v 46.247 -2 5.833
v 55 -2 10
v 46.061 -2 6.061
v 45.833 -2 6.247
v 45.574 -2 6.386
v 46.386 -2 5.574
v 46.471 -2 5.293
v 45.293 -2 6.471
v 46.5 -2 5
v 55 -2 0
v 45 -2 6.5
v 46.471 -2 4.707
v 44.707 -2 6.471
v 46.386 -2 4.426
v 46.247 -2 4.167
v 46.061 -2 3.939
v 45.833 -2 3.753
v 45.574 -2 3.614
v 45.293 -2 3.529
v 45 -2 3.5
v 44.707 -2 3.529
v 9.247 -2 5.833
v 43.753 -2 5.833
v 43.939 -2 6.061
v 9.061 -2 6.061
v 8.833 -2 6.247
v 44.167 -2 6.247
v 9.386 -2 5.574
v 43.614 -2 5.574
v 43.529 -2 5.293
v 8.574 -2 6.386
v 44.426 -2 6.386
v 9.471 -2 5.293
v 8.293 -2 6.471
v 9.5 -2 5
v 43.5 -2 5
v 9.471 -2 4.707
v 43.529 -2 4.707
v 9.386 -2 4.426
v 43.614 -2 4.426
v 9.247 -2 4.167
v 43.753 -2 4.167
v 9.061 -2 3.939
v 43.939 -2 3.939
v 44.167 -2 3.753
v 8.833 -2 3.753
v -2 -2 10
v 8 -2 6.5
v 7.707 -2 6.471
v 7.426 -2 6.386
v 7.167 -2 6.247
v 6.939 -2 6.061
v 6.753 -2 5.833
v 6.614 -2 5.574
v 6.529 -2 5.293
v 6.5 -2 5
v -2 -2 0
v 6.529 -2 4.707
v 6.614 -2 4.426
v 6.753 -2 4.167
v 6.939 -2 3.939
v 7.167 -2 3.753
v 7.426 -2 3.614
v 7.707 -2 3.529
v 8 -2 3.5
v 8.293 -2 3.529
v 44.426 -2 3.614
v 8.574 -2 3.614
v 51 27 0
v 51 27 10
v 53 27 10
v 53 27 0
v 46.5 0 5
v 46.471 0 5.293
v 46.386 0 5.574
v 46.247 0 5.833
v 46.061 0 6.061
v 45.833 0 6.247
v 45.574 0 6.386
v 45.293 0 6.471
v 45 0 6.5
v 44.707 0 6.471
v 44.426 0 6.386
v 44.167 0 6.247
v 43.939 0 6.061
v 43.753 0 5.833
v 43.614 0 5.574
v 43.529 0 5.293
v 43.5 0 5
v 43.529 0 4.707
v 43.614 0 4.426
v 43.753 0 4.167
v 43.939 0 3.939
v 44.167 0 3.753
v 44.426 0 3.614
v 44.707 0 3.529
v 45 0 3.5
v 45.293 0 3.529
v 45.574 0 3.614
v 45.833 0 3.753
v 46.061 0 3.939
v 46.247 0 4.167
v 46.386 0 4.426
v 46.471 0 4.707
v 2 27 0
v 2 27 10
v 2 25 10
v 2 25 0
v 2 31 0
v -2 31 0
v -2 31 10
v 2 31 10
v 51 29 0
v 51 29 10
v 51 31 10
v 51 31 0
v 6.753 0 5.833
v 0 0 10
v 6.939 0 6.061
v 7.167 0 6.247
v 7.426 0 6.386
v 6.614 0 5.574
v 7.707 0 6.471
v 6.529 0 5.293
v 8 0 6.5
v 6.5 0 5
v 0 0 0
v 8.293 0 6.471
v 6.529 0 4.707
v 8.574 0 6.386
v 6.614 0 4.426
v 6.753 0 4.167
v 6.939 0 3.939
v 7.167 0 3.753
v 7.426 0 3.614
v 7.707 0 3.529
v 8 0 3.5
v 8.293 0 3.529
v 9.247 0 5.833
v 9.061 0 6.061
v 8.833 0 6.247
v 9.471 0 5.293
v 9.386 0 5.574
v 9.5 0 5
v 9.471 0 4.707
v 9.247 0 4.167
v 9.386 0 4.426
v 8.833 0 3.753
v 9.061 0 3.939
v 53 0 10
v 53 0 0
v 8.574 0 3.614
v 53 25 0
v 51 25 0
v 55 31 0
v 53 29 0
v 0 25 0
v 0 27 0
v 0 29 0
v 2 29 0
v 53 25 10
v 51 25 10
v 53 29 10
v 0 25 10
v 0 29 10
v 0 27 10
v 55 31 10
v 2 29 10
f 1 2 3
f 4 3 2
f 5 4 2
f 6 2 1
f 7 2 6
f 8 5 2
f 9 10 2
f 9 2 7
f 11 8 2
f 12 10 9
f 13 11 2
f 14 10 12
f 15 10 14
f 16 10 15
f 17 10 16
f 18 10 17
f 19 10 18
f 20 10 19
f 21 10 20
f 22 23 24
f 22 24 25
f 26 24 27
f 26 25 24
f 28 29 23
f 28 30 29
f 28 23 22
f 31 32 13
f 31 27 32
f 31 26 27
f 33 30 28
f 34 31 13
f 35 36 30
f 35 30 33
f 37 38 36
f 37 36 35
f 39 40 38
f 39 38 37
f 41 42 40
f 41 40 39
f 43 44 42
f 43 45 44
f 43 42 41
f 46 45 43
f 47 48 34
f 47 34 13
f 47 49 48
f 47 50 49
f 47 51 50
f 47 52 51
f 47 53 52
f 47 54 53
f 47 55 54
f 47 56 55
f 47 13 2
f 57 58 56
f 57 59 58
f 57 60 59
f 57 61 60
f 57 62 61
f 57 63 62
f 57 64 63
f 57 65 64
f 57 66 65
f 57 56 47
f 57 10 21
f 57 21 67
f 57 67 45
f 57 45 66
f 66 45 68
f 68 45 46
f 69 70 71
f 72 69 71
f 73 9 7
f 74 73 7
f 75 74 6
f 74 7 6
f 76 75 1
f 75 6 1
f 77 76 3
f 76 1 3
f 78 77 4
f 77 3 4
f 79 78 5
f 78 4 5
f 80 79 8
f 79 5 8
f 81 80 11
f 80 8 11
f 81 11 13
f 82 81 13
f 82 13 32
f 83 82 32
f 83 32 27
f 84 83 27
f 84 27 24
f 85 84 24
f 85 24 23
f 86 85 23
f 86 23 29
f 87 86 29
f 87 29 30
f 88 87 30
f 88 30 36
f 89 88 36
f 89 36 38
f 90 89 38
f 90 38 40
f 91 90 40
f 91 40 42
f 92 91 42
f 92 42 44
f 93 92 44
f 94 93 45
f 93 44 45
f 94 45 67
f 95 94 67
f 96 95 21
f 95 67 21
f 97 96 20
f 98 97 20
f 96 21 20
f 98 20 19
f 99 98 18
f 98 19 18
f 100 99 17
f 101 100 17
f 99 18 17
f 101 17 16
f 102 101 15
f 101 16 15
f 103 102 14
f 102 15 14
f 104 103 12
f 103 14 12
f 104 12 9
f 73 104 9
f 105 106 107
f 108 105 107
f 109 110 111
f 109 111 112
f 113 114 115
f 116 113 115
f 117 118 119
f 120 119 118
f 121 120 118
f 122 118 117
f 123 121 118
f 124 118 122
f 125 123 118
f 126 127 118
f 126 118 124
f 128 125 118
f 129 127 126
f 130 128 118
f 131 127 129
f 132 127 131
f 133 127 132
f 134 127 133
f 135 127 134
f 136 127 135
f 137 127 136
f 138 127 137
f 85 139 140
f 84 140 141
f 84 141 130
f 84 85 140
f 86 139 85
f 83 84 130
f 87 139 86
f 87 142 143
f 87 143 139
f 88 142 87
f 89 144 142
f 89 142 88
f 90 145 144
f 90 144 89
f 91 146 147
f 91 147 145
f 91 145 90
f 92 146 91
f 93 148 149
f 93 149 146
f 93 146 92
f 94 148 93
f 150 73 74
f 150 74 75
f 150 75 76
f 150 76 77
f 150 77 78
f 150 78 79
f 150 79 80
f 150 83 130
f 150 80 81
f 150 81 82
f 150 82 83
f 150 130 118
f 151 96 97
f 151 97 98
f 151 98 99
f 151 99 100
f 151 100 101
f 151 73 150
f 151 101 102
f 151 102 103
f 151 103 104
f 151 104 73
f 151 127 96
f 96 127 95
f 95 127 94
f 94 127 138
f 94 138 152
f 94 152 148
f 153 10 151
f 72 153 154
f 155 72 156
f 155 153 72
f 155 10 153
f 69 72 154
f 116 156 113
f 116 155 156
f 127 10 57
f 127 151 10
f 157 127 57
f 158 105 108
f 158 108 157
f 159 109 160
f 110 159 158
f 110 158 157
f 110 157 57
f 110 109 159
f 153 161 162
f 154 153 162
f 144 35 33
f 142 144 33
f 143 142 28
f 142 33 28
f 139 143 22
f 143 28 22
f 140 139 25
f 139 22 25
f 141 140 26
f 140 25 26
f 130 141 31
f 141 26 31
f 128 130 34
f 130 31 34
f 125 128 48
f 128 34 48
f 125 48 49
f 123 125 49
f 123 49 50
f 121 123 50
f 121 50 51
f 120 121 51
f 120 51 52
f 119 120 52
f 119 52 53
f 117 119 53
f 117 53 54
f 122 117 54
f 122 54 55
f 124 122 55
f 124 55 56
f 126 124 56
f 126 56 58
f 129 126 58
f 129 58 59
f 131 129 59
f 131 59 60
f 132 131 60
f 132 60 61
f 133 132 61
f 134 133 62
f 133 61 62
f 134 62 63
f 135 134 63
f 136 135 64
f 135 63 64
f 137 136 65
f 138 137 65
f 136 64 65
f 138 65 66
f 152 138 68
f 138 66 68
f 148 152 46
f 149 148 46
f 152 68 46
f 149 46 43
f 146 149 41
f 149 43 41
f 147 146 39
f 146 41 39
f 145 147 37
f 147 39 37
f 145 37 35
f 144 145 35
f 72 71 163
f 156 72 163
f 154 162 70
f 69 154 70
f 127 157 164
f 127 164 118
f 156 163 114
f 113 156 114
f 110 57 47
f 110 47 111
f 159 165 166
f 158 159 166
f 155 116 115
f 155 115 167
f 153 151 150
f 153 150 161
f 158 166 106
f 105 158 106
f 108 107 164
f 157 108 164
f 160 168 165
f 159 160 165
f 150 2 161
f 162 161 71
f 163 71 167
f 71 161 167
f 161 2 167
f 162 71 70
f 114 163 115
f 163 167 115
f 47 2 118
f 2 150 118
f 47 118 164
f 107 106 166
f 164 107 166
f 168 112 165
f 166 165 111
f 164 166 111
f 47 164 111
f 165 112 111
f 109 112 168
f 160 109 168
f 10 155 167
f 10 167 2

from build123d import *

# Parameters (mm, degrees)
SALIENTE_EXTRUIR1_DEPTH = 10
CROQUIS2_R              = 1.5
CORTAR_EXTRUIR1_DEPTH   = 10


with BuildPart() as part:
    # Croquis1 → Saliente-Extruir1 (new body)
    with BuildSketch(Plane.XY):
        Polygon((0, 0), (53, 0), (53, 25), (51, 25), (51, 27), (53, 27), (53, 29), (51, 29), (51, 31), (55, 31), (55, -2), (-2, -2), (-2, 31), (2, 31), (2, 29), (0, 29), (0, 27), (2, 27), (2, 25), (0, 25), align=None)
    extrude(amount=SALIENTE_EXTRUIR1_DEPTH)

    # Croquis2 → Cortar-Extruir1 (cut)
    with BuildSketch(Plane.XZ.offset(2)):
        with Locations((45, 5)):
            Circle(CROQUIS2_R)
        with Locations((8, 5)):
            Circle(CROQUIS2_R)
    extrude(amount=-CORTAR_EXTRUIR1_DEPTH, mode=Mode.SUBTRACT)


solid = part.part
